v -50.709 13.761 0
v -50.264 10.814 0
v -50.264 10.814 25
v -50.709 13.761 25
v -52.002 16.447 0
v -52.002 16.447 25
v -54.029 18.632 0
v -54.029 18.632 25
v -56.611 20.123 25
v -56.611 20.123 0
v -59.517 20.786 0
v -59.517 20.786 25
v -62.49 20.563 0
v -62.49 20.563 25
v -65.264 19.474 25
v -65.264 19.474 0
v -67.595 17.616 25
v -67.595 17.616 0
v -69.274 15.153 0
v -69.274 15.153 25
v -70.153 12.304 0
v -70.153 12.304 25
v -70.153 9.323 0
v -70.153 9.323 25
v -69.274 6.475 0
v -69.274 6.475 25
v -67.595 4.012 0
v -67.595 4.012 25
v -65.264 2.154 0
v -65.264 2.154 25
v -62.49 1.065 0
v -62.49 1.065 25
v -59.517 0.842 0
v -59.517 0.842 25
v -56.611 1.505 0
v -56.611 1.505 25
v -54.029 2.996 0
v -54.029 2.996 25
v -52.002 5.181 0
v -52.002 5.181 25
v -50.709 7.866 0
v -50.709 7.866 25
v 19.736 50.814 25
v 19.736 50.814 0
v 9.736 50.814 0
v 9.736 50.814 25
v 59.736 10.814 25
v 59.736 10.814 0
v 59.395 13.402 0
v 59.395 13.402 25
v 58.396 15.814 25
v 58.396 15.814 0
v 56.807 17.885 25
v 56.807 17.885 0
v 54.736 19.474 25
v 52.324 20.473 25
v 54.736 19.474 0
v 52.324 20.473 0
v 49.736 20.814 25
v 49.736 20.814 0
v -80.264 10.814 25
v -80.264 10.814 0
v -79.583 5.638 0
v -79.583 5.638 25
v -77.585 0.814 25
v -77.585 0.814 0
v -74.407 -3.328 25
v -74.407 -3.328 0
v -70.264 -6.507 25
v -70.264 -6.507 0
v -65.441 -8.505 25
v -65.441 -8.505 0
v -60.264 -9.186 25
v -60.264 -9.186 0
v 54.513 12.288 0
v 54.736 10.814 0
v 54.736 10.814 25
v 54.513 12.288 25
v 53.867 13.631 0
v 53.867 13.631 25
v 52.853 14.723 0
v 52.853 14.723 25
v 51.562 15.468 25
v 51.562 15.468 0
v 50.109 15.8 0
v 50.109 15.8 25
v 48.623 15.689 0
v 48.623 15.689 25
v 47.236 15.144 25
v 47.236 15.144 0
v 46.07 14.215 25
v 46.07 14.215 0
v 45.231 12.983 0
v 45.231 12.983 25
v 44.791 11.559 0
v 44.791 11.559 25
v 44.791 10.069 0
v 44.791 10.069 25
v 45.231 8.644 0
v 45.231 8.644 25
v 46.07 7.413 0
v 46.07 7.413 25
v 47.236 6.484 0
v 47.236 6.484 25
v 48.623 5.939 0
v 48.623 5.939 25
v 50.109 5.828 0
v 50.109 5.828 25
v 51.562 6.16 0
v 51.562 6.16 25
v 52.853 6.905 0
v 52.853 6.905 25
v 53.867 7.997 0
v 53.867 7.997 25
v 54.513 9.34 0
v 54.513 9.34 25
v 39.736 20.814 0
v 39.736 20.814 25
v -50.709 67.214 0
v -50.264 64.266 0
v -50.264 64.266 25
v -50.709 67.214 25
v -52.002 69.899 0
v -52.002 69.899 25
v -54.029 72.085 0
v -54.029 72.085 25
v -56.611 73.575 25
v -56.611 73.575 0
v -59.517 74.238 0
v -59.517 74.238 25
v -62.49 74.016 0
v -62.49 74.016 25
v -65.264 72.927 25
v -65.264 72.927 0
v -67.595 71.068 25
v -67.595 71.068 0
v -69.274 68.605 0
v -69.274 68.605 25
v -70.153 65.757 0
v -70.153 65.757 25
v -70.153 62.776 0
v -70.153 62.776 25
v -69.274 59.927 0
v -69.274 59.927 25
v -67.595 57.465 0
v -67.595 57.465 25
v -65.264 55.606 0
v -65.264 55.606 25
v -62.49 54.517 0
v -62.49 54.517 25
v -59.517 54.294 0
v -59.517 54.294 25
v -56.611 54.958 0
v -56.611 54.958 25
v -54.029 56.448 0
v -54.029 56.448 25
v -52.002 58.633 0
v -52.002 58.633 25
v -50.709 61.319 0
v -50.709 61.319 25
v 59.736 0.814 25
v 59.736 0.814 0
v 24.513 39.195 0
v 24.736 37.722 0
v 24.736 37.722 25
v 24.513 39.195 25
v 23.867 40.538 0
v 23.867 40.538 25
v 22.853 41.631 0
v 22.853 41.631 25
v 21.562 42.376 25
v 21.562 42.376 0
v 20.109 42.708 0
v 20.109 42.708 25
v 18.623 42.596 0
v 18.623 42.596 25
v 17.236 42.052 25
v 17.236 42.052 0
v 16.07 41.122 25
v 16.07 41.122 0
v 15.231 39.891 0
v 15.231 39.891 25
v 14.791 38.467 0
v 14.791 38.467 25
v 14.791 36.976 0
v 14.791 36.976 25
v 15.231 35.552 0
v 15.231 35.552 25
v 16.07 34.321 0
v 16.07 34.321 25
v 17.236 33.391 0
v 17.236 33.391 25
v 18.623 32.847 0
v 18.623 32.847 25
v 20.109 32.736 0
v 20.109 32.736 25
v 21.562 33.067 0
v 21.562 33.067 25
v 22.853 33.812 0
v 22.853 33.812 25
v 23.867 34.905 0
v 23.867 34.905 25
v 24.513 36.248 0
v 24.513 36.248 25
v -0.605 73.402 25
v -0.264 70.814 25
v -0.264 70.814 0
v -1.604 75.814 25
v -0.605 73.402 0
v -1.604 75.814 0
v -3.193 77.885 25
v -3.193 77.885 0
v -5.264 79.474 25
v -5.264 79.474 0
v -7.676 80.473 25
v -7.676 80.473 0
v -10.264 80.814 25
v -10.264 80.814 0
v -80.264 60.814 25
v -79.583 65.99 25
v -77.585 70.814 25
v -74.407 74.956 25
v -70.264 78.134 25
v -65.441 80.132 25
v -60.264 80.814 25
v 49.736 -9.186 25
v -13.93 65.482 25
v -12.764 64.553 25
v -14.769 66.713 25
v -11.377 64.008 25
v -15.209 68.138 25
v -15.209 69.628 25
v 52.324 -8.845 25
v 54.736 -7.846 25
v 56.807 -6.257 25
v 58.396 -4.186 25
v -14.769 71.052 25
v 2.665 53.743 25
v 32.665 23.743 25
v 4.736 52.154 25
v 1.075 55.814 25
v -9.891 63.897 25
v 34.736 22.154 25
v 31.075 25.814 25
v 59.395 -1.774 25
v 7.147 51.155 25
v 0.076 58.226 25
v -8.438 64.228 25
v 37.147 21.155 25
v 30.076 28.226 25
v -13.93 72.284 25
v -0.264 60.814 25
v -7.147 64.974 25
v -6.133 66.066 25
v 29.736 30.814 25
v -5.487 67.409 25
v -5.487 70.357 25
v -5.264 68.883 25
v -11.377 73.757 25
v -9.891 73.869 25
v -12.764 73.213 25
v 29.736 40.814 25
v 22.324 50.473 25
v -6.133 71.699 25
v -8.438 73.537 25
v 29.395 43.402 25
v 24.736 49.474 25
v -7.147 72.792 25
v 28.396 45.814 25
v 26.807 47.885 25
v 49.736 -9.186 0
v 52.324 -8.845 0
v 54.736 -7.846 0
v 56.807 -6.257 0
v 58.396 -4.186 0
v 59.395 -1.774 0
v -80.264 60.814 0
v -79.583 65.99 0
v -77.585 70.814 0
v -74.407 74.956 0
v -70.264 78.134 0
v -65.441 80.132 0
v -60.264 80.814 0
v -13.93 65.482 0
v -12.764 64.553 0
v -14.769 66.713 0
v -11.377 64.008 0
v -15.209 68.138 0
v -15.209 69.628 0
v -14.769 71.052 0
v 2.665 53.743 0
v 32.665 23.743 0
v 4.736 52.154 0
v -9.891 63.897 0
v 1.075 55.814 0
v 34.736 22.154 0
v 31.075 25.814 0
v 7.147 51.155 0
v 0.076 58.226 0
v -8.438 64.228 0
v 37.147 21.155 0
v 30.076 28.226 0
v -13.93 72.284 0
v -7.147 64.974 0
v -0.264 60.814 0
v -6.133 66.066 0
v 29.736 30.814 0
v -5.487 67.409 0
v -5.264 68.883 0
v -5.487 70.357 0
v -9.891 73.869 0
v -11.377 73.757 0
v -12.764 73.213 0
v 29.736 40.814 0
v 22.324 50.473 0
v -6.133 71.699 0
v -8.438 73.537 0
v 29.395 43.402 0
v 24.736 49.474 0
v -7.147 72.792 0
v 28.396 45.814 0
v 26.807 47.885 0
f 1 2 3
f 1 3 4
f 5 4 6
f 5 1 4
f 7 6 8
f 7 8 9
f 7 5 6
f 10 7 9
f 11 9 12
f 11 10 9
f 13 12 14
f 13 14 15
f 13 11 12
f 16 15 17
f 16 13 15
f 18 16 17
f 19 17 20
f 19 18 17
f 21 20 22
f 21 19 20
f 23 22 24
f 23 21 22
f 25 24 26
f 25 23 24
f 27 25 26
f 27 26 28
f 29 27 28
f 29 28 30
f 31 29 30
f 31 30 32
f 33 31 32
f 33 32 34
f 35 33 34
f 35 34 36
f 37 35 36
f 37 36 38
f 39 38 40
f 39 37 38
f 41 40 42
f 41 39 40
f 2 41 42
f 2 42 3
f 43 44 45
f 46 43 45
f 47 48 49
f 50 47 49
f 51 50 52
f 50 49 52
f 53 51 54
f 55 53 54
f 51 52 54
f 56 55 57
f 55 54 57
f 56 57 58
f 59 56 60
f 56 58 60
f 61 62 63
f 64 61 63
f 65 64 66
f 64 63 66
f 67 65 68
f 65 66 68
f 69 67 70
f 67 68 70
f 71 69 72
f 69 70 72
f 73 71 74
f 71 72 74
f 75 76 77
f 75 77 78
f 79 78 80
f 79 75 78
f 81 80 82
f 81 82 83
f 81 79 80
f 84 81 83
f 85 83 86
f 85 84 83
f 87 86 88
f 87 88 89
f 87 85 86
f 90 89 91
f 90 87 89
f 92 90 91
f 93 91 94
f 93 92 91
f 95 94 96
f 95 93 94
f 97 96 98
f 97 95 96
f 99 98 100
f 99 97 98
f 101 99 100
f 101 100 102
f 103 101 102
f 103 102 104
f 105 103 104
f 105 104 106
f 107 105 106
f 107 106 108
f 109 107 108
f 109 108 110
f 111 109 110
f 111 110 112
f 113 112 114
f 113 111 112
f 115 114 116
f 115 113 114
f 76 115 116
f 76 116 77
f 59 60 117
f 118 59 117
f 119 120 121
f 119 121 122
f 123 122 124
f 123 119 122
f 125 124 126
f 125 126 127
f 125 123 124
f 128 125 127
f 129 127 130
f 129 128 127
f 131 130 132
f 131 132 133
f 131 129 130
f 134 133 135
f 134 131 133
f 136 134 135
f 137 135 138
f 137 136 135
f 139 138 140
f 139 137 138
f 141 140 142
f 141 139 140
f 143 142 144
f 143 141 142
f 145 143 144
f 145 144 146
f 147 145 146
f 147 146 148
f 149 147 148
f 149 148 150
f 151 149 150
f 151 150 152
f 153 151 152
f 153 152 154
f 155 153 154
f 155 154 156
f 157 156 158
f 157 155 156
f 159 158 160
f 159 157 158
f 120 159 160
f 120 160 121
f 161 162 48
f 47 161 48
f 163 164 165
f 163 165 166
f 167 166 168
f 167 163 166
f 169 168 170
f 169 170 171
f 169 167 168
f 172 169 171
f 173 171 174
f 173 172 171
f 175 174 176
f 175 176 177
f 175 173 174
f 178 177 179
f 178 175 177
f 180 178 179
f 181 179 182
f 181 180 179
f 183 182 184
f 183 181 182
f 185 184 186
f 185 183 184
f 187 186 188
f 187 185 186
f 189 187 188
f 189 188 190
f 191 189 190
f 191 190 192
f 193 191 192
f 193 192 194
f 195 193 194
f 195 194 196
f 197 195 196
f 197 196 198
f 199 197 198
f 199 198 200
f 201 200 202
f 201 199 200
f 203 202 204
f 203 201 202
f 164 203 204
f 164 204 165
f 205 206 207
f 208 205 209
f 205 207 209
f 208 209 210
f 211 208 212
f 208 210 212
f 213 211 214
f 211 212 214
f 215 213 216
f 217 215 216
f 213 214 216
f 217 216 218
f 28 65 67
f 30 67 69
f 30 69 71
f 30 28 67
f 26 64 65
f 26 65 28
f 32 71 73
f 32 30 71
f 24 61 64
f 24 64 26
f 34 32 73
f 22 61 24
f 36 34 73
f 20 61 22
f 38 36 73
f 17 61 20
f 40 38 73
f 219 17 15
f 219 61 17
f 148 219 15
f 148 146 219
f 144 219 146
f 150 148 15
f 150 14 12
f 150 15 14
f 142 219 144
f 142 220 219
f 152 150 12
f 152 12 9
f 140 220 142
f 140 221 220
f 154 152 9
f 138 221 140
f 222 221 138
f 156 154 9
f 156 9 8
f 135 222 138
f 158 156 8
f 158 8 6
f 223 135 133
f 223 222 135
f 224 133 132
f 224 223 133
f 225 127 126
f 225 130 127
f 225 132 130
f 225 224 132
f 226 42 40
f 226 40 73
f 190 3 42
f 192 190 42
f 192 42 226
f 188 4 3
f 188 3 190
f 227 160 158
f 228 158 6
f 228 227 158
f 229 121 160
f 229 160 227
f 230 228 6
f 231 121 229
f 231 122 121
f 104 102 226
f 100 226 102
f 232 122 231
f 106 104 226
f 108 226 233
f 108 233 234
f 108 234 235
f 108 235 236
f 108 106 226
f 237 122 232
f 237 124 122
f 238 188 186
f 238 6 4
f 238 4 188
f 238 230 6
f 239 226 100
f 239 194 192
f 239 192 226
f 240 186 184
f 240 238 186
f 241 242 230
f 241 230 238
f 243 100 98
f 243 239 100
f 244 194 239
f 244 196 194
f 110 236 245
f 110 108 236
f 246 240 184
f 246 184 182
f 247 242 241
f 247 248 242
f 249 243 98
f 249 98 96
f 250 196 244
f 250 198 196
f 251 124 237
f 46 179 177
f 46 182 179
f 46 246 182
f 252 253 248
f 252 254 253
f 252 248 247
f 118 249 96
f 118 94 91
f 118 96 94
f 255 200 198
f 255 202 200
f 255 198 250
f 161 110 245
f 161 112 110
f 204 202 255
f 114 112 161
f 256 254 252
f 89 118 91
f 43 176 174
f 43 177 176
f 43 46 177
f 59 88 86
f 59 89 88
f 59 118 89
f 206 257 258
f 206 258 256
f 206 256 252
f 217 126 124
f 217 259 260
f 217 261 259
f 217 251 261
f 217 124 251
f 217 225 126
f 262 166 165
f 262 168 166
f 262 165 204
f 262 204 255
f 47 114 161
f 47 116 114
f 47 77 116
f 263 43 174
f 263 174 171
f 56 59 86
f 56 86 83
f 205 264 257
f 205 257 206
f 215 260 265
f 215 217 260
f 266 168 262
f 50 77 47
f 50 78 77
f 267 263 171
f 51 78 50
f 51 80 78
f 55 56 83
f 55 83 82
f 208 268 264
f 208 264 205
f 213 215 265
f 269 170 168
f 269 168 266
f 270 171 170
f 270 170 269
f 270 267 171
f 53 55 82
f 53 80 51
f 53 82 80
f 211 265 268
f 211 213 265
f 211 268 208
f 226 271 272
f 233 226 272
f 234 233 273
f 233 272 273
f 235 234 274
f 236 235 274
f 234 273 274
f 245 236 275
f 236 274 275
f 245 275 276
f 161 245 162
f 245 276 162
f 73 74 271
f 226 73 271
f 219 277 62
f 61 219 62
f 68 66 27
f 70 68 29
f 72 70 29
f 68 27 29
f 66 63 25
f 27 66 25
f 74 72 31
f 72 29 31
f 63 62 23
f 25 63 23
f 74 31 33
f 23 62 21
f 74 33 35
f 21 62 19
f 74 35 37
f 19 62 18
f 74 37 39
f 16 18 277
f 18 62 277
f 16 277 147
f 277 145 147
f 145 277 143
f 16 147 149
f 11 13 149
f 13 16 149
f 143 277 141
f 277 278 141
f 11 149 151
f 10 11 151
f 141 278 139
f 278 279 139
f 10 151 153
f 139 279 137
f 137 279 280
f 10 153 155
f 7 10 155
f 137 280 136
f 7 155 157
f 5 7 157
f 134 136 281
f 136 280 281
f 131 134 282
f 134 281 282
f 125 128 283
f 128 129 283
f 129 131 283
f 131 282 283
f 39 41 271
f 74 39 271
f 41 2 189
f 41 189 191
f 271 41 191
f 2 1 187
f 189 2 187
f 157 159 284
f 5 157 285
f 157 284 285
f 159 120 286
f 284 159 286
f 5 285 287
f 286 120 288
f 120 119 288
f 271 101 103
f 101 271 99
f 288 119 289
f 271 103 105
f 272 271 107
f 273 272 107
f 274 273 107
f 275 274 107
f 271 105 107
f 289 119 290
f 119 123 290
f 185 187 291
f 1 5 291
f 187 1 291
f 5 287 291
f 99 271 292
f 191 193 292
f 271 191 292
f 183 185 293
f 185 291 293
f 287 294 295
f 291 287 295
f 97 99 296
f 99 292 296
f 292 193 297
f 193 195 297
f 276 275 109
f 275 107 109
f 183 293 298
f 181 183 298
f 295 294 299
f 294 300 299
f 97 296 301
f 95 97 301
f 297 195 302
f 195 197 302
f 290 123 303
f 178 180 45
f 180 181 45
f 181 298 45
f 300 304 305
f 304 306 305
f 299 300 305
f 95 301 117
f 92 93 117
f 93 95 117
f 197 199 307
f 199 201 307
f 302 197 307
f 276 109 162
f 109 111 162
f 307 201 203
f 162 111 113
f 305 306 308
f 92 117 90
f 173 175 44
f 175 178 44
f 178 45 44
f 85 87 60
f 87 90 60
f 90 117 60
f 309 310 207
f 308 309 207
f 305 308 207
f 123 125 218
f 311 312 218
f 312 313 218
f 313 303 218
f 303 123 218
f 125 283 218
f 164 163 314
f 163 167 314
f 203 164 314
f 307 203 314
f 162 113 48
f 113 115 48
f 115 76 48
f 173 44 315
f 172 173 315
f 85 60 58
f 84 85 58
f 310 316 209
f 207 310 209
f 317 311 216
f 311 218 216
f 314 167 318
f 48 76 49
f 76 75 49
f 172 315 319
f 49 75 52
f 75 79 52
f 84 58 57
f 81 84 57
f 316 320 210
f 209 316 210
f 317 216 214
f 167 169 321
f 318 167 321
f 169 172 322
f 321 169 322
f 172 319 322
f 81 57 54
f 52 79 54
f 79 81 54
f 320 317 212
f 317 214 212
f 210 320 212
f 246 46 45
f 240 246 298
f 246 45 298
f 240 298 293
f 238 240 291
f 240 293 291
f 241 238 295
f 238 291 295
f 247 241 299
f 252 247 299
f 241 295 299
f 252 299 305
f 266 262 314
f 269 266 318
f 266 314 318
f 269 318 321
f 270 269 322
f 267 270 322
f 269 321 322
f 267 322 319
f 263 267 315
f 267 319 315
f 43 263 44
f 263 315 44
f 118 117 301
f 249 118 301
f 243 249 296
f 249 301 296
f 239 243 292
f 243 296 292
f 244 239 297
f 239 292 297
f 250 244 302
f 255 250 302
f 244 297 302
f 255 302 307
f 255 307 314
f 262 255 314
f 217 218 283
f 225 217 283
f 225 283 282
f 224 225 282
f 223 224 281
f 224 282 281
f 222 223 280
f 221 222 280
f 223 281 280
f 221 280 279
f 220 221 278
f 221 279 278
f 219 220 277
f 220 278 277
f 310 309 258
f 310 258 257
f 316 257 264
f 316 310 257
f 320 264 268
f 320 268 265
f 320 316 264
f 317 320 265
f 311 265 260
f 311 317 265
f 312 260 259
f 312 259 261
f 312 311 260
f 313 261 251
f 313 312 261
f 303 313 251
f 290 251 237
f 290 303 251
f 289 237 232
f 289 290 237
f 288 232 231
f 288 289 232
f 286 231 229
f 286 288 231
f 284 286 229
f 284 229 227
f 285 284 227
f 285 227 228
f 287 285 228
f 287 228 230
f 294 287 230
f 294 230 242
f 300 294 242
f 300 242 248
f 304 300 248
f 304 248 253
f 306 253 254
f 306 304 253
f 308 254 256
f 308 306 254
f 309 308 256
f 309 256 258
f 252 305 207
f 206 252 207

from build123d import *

# Parameters (mm, degrees)
F0_R     = 10
F0_R_2   = 5
F1_DEPTH = 25


with BuildPart() as f1:
    # F0 (on Top) → F1 (new body)
    with BuildSketch(Plane.XY):
        with BuildLine():
            ThreePointArc((-80.264366, 10.813902), (-74.406502, -3.328234), (-60.264366, -9.186098))
            Line((-60.264366, -9.186098), (49.735634, -9.186098))
            ThreePointArc((49.735634, -9.186098), (56.806702, -6.257166), (59.735634, 0.813902))
            Line((59.735634, 0.813902), (59.735634, 10.813902))
            ThreePointArc((59.735634, 10.813902), (56.806702, 17.88497), (49.735634, 20.813902))
            Line((49.735634, 20.813902), (39.735634, 20.813902))
            ThreePointArc((39.735634, 20.813902), (32.664566, 23.742834), (29.735634, 30.813902))
            Line((29.735634, 30.813902), (29.735634, 40.813902))
            ThreePointArc((29.735634, 40.813902), (26.806702, 47.88497), (19.735634, 50.813902))
            Line((19.735634, 50.813902), (9.735634, 50.813902))
            ThreePointArc((9.735634, 50.813902), (2.664566, 53.742834), (-0.264366, 60.813902))
            Line((-0.264366, 60.813902), (-0.264366, 70.813902))
            ThreePointArc((-0.264366, 70.813902), (-3.193298, 77.88497), (-10.264366, 80.813902))
            Line((-10.264366, 80.813902), (-60.264366, 80.813902))
            ThreePointArc((-60.264366, 80.813902), (-74.406502, 74.956037), (-80.264366, 60.813902))
            Line((-80.264366, 60.813902), (-80.264366, 10.813902))
        make_face()
        with Locations((-60.264366, 10.813902)):
            Circle(F0_R, mode=Mode.SUBTRACT)
        with Locations((49.735634, 10.813902)):
            Circle(F0_R_2, mode=Mode.SUBTRACT)
        with Locations((-60.264366, 64.266279)):
            Circle(F0_R, mode=Mode.SUBTRACT)
        with Locations((-10.264366, 68.882748)):
            Circle(F0_R_2, mode=Mode.SUBTRACT)
        with Locations((19.735634, 37.721559)):
            Circle(F0_R_2, mode=Mode.SUBTRACT)
    extrude(amount=F1_DEPTH)


solid = f1.part
